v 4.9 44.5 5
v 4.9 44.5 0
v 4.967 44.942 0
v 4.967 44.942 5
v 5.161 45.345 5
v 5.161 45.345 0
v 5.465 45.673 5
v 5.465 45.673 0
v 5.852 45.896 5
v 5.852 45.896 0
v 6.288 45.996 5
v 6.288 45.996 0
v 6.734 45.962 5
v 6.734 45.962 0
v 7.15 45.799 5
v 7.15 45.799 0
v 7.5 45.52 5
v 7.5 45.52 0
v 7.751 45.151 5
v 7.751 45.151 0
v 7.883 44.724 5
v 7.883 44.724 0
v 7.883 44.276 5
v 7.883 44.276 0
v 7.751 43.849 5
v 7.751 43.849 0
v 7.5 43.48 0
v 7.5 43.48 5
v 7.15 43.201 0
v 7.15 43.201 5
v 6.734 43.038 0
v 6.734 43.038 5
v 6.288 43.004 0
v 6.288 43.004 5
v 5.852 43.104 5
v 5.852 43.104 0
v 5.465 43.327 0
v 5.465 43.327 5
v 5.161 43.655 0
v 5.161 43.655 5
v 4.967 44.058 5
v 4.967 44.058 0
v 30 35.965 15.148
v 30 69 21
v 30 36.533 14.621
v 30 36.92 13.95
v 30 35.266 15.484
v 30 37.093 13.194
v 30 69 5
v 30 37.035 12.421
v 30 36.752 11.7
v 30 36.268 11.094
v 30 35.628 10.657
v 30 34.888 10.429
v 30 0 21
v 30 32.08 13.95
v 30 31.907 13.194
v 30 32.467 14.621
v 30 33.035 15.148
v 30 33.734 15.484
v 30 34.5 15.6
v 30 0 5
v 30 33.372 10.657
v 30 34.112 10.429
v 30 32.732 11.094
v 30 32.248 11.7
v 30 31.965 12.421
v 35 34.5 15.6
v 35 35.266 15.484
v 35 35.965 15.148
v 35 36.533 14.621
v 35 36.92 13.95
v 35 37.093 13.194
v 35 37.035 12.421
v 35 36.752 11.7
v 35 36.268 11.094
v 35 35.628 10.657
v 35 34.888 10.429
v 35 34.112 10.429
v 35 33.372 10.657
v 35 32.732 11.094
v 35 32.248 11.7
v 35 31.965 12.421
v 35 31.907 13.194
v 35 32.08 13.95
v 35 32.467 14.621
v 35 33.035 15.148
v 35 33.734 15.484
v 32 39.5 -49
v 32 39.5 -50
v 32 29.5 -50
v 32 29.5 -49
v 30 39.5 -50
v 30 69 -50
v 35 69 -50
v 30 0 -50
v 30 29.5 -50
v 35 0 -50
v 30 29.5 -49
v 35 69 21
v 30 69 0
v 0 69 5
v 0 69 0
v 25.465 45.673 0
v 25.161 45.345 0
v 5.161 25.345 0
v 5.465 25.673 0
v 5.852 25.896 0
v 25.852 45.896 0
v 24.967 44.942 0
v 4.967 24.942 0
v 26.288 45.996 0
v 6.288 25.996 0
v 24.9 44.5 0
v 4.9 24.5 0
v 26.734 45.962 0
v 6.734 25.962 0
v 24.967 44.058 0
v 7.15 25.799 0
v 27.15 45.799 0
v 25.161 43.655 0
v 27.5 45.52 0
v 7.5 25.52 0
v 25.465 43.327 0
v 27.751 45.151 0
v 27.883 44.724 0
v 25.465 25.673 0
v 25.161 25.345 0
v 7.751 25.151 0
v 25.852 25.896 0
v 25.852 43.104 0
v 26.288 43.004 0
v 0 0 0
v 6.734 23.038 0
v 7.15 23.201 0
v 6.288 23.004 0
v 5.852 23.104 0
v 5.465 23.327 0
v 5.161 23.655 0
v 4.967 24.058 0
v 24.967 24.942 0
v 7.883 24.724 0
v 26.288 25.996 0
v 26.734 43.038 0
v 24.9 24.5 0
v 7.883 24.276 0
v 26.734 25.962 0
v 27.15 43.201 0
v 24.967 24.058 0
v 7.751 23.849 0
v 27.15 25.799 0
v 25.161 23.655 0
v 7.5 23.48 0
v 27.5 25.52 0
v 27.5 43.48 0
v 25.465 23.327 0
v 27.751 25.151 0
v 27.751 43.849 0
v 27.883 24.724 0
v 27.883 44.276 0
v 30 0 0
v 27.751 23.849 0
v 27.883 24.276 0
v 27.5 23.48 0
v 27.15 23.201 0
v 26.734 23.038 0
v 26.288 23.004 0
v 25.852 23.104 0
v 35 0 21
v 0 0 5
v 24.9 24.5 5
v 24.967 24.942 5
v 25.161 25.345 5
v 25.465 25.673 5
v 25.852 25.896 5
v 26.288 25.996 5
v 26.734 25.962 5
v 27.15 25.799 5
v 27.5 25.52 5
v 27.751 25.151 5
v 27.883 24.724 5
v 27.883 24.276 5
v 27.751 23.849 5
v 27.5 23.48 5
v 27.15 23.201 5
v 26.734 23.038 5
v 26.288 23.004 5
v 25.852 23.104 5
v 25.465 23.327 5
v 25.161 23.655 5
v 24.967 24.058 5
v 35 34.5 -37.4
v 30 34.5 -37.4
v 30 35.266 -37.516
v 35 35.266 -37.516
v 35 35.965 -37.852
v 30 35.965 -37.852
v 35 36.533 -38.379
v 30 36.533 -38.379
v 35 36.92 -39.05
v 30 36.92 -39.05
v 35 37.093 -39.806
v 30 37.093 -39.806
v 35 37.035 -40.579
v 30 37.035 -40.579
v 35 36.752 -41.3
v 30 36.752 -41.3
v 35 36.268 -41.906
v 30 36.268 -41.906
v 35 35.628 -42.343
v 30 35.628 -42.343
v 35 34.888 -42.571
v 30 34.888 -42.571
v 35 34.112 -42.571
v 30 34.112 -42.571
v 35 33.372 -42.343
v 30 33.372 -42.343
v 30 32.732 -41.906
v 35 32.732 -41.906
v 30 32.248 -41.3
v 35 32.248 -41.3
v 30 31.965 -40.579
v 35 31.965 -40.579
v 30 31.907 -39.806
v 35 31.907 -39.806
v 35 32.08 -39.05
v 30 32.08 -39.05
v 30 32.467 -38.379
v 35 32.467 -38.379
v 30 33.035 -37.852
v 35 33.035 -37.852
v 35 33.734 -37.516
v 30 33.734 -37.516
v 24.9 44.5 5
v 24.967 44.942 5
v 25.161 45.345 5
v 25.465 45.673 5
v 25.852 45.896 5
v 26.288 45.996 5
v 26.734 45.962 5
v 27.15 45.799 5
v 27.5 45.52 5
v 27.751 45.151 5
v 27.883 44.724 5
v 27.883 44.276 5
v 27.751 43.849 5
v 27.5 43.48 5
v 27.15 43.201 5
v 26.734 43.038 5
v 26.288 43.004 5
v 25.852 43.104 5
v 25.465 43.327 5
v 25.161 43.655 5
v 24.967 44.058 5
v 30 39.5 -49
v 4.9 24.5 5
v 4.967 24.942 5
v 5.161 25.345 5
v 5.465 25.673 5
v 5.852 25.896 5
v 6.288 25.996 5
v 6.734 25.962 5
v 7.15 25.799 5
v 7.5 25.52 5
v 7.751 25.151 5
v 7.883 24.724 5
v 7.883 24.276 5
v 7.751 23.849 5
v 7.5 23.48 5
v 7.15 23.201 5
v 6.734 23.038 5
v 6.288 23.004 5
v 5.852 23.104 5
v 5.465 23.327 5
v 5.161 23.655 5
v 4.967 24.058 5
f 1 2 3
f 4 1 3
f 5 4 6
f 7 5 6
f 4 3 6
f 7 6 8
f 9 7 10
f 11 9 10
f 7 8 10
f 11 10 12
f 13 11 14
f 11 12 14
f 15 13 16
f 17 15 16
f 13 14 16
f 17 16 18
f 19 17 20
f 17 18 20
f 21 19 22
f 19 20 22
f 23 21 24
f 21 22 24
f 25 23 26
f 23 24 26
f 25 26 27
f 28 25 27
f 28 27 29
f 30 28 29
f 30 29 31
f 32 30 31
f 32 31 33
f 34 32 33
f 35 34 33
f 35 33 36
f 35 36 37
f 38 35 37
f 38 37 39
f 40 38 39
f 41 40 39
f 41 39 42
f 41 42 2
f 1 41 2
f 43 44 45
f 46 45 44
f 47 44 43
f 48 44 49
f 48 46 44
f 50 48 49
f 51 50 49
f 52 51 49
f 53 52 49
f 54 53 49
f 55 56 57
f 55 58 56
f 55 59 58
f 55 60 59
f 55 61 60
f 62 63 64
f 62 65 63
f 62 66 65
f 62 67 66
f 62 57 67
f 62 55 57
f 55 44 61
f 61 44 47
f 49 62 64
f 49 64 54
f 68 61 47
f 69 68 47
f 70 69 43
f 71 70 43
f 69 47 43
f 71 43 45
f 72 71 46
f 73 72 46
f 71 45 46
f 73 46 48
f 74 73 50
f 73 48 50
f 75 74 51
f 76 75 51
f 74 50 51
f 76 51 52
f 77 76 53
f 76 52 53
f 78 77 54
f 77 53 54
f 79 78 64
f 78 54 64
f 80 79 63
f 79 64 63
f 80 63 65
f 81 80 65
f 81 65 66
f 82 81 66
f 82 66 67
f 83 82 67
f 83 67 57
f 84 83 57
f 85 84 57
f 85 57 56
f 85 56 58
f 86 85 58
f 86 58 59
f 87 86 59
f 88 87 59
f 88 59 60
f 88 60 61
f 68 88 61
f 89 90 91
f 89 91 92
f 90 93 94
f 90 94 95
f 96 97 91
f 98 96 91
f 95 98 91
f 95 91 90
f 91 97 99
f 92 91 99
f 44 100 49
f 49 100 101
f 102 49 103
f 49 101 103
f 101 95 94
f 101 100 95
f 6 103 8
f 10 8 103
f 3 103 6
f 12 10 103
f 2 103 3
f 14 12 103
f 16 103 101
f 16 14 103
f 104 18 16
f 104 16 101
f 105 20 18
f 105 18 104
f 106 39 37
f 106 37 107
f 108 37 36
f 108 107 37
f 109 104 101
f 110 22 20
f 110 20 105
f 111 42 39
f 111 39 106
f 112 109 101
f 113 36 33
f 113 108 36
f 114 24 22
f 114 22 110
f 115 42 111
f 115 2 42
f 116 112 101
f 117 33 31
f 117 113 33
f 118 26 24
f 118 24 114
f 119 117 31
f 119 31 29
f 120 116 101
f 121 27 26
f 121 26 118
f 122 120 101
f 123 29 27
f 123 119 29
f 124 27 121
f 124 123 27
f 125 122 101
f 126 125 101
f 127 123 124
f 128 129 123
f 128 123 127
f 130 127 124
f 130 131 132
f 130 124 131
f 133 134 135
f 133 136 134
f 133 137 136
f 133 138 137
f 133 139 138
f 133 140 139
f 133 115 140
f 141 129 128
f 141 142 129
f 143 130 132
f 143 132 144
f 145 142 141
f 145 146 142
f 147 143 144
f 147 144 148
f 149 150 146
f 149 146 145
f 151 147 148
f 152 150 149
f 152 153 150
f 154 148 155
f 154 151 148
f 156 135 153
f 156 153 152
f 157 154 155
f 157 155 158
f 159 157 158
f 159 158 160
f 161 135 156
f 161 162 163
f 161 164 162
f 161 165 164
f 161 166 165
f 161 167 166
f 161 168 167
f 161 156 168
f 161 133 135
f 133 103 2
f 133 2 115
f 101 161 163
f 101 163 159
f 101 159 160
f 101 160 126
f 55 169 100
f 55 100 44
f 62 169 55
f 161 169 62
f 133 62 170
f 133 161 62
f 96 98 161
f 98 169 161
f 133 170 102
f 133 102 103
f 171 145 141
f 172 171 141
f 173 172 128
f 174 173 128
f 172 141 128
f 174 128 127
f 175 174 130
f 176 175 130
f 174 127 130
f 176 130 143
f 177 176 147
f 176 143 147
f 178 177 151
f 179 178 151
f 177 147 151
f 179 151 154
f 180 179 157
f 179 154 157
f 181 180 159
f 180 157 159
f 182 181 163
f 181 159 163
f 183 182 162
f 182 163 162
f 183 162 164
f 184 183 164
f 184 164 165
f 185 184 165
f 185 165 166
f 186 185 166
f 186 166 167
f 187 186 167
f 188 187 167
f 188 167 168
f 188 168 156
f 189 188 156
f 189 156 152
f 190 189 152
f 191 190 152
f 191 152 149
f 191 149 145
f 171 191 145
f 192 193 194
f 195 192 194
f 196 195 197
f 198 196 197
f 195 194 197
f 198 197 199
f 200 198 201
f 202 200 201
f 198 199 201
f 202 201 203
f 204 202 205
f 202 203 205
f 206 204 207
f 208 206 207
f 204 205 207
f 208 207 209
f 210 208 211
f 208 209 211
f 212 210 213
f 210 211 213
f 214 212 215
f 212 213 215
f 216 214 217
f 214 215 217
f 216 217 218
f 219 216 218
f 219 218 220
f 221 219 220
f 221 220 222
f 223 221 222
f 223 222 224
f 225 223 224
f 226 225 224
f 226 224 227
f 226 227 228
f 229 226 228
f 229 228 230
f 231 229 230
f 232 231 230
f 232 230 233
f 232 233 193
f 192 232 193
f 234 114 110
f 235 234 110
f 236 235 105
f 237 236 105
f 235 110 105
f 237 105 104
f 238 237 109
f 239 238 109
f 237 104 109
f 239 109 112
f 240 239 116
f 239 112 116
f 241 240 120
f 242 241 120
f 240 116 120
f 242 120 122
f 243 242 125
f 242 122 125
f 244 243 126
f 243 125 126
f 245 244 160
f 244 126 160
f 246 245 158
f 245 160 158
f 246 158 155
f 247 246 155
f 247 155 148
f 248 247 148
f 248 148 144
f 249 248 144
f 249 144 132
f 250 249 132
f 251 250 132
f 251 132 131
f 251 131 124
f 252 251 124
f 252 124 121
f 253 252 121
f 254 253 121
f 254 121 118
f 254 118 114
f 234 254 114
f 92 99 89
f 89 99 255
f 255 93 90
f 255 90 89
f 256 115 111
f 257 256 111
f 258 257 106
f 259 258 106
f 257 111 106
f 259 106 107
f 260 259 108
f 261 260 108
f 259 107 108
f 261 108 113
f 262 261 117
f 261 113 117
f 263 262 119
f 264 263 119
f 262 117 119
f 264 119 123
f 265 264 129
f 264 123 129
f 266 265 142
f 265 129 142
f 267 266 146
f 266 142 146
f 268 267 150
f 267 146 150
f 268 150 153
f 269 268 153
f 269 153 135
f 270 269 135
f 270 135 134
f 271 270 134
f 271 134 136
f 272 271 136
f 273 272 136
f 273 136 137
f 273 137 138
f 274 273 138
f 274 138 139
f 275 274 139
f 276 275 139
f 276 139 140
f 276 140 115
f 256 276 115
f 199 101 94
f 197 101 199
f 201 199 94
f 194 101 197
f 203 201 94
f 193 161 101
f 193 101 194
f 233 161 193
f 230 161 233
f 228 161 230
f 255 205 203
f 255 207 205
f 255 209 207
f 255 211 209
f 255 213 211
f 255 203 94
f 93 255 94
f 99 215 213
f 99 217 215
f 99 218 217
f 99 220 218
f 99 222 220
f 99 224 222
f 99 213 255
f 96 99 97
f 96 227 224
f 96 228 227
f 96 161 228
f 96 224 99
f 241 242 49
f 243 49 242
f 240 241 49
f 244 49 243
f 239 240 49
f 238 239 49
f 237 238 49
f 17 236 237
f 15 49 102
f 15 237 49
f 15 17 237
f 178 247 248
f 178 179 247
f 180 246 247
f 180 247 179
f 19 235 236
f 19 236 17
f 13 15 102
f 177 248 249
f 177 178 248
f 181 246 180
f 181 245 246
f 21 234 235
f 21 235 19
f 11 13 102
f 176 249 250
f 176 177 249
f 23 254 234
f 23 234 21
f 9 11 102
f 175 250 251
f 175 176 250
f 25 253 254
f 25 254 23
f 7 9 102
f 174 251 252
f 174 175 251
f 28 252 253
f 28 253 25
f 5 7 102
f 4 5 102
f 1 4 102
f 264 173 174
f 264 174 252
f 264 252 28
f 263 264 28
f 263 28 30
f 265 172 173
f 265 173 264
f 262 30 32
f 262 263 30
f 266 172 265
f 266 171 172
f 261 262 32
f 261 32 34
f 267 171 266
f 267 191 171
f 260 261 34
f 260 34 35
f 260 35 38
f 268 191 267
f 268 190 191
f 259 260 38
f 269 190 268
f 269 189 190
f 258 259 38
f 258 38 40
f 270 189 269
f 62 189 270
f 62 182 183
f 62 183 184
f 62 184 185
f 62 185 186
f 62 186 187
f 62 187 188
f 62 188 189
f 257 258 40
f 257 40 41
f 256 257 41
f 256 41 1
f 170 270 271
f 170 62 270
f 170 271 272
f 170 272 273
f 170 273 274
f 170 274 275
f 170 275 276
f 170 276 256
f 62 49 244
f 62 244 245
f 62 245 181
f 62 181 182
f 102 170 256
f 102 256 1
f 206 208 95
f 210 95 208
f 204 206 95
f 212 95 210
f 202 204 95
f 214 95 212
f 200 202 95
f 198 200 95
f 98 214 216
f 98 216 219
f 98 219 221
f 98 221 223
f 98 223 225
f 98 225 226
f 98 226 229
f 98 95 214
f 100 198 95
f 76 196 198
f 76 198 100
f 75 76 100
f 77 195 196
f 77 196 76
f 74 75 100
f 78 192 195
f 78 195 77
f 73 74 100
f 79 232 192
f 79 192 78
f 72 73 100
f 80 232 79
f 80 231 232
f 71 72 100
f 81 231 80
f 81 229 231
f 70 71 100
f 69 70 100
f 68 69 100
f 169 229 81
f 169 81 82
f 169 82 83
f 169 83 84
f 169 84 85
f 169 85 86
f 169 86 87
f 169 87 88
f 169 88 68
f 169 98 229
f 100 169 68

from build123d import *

# Parameters (mm, degrees)
EXTRUDE_1_DEPTH     = 69
HOLE_WIZARD_1_D     = 3
SKETCH_5_R          = 2.6
CUT_EXTRUDE_1_DEPTH = 10
SKETCH_6_R          = 2.6
CUT_EXTRUDE_2_DEPTH = 10
SKETCH_8_W          = 2
SKETCH_8_H          = 10
CUT_EXTRUDE_4_DEPTH = 2


with BuildPart() as part:
    # 草图1 → 凸台-拉伸1 (new body)
    with BuildSketch(Plane(origin=(0, 0, 0), x_dir=(1, 0, 0), z_dir=(0, 1, 0))):
        Polygon((30, 0), (30, 50), (35, 50), (35, -21), (30, -21), (30, -5), (0, -5), (0, 0), align=None)
    extrude(amount=EXTRUDE_1_DEPTH)

    # 孔1 (through all)
    with Locations(Plane.XY.offset(5)):
        with Locations((26.4, 44.5), (26.4, 24.5), (6.4, 44.5), (6.4, 24.5)):
            Hole(HOLE_WIZARD_1_D / 2)

    # 草图5 → 切除-拉伸1 (cut)
    with BuildSketch(Plane.ZY.offset(-30)):
        with Locations((13, 34.5)):
            Circle(SKETCH_5_R)
    extrude(amount=-CUT_EXTRUDE_1_DEPTH, mode=Mode.SUBTRACT)

    # 草图6 → 切除-拉伸2 (cut)
    with BuildSketch(Plane.ZY.offset(-30)):
        with Locations((-40, 34.5)):
            Circle(SKETCH_6_R)
    extrude(amount=-CUT_EXTRUDE_2_DEPTH, mode=Mode.SUBTRACT)

    # 草图8 → 切除-拉伸4 (cut)
    with BuildSketch(Plane.ZY.offset(-30)):
        with Locations((-50, 34.5)):
            Rectangle(SKETCH_8_W, SKETCH_8_H)
    extrude(amount=-CUT_EXTRUDE_4_DEPTH, mode=Mode.SUBTRACT)


solid = part.part
